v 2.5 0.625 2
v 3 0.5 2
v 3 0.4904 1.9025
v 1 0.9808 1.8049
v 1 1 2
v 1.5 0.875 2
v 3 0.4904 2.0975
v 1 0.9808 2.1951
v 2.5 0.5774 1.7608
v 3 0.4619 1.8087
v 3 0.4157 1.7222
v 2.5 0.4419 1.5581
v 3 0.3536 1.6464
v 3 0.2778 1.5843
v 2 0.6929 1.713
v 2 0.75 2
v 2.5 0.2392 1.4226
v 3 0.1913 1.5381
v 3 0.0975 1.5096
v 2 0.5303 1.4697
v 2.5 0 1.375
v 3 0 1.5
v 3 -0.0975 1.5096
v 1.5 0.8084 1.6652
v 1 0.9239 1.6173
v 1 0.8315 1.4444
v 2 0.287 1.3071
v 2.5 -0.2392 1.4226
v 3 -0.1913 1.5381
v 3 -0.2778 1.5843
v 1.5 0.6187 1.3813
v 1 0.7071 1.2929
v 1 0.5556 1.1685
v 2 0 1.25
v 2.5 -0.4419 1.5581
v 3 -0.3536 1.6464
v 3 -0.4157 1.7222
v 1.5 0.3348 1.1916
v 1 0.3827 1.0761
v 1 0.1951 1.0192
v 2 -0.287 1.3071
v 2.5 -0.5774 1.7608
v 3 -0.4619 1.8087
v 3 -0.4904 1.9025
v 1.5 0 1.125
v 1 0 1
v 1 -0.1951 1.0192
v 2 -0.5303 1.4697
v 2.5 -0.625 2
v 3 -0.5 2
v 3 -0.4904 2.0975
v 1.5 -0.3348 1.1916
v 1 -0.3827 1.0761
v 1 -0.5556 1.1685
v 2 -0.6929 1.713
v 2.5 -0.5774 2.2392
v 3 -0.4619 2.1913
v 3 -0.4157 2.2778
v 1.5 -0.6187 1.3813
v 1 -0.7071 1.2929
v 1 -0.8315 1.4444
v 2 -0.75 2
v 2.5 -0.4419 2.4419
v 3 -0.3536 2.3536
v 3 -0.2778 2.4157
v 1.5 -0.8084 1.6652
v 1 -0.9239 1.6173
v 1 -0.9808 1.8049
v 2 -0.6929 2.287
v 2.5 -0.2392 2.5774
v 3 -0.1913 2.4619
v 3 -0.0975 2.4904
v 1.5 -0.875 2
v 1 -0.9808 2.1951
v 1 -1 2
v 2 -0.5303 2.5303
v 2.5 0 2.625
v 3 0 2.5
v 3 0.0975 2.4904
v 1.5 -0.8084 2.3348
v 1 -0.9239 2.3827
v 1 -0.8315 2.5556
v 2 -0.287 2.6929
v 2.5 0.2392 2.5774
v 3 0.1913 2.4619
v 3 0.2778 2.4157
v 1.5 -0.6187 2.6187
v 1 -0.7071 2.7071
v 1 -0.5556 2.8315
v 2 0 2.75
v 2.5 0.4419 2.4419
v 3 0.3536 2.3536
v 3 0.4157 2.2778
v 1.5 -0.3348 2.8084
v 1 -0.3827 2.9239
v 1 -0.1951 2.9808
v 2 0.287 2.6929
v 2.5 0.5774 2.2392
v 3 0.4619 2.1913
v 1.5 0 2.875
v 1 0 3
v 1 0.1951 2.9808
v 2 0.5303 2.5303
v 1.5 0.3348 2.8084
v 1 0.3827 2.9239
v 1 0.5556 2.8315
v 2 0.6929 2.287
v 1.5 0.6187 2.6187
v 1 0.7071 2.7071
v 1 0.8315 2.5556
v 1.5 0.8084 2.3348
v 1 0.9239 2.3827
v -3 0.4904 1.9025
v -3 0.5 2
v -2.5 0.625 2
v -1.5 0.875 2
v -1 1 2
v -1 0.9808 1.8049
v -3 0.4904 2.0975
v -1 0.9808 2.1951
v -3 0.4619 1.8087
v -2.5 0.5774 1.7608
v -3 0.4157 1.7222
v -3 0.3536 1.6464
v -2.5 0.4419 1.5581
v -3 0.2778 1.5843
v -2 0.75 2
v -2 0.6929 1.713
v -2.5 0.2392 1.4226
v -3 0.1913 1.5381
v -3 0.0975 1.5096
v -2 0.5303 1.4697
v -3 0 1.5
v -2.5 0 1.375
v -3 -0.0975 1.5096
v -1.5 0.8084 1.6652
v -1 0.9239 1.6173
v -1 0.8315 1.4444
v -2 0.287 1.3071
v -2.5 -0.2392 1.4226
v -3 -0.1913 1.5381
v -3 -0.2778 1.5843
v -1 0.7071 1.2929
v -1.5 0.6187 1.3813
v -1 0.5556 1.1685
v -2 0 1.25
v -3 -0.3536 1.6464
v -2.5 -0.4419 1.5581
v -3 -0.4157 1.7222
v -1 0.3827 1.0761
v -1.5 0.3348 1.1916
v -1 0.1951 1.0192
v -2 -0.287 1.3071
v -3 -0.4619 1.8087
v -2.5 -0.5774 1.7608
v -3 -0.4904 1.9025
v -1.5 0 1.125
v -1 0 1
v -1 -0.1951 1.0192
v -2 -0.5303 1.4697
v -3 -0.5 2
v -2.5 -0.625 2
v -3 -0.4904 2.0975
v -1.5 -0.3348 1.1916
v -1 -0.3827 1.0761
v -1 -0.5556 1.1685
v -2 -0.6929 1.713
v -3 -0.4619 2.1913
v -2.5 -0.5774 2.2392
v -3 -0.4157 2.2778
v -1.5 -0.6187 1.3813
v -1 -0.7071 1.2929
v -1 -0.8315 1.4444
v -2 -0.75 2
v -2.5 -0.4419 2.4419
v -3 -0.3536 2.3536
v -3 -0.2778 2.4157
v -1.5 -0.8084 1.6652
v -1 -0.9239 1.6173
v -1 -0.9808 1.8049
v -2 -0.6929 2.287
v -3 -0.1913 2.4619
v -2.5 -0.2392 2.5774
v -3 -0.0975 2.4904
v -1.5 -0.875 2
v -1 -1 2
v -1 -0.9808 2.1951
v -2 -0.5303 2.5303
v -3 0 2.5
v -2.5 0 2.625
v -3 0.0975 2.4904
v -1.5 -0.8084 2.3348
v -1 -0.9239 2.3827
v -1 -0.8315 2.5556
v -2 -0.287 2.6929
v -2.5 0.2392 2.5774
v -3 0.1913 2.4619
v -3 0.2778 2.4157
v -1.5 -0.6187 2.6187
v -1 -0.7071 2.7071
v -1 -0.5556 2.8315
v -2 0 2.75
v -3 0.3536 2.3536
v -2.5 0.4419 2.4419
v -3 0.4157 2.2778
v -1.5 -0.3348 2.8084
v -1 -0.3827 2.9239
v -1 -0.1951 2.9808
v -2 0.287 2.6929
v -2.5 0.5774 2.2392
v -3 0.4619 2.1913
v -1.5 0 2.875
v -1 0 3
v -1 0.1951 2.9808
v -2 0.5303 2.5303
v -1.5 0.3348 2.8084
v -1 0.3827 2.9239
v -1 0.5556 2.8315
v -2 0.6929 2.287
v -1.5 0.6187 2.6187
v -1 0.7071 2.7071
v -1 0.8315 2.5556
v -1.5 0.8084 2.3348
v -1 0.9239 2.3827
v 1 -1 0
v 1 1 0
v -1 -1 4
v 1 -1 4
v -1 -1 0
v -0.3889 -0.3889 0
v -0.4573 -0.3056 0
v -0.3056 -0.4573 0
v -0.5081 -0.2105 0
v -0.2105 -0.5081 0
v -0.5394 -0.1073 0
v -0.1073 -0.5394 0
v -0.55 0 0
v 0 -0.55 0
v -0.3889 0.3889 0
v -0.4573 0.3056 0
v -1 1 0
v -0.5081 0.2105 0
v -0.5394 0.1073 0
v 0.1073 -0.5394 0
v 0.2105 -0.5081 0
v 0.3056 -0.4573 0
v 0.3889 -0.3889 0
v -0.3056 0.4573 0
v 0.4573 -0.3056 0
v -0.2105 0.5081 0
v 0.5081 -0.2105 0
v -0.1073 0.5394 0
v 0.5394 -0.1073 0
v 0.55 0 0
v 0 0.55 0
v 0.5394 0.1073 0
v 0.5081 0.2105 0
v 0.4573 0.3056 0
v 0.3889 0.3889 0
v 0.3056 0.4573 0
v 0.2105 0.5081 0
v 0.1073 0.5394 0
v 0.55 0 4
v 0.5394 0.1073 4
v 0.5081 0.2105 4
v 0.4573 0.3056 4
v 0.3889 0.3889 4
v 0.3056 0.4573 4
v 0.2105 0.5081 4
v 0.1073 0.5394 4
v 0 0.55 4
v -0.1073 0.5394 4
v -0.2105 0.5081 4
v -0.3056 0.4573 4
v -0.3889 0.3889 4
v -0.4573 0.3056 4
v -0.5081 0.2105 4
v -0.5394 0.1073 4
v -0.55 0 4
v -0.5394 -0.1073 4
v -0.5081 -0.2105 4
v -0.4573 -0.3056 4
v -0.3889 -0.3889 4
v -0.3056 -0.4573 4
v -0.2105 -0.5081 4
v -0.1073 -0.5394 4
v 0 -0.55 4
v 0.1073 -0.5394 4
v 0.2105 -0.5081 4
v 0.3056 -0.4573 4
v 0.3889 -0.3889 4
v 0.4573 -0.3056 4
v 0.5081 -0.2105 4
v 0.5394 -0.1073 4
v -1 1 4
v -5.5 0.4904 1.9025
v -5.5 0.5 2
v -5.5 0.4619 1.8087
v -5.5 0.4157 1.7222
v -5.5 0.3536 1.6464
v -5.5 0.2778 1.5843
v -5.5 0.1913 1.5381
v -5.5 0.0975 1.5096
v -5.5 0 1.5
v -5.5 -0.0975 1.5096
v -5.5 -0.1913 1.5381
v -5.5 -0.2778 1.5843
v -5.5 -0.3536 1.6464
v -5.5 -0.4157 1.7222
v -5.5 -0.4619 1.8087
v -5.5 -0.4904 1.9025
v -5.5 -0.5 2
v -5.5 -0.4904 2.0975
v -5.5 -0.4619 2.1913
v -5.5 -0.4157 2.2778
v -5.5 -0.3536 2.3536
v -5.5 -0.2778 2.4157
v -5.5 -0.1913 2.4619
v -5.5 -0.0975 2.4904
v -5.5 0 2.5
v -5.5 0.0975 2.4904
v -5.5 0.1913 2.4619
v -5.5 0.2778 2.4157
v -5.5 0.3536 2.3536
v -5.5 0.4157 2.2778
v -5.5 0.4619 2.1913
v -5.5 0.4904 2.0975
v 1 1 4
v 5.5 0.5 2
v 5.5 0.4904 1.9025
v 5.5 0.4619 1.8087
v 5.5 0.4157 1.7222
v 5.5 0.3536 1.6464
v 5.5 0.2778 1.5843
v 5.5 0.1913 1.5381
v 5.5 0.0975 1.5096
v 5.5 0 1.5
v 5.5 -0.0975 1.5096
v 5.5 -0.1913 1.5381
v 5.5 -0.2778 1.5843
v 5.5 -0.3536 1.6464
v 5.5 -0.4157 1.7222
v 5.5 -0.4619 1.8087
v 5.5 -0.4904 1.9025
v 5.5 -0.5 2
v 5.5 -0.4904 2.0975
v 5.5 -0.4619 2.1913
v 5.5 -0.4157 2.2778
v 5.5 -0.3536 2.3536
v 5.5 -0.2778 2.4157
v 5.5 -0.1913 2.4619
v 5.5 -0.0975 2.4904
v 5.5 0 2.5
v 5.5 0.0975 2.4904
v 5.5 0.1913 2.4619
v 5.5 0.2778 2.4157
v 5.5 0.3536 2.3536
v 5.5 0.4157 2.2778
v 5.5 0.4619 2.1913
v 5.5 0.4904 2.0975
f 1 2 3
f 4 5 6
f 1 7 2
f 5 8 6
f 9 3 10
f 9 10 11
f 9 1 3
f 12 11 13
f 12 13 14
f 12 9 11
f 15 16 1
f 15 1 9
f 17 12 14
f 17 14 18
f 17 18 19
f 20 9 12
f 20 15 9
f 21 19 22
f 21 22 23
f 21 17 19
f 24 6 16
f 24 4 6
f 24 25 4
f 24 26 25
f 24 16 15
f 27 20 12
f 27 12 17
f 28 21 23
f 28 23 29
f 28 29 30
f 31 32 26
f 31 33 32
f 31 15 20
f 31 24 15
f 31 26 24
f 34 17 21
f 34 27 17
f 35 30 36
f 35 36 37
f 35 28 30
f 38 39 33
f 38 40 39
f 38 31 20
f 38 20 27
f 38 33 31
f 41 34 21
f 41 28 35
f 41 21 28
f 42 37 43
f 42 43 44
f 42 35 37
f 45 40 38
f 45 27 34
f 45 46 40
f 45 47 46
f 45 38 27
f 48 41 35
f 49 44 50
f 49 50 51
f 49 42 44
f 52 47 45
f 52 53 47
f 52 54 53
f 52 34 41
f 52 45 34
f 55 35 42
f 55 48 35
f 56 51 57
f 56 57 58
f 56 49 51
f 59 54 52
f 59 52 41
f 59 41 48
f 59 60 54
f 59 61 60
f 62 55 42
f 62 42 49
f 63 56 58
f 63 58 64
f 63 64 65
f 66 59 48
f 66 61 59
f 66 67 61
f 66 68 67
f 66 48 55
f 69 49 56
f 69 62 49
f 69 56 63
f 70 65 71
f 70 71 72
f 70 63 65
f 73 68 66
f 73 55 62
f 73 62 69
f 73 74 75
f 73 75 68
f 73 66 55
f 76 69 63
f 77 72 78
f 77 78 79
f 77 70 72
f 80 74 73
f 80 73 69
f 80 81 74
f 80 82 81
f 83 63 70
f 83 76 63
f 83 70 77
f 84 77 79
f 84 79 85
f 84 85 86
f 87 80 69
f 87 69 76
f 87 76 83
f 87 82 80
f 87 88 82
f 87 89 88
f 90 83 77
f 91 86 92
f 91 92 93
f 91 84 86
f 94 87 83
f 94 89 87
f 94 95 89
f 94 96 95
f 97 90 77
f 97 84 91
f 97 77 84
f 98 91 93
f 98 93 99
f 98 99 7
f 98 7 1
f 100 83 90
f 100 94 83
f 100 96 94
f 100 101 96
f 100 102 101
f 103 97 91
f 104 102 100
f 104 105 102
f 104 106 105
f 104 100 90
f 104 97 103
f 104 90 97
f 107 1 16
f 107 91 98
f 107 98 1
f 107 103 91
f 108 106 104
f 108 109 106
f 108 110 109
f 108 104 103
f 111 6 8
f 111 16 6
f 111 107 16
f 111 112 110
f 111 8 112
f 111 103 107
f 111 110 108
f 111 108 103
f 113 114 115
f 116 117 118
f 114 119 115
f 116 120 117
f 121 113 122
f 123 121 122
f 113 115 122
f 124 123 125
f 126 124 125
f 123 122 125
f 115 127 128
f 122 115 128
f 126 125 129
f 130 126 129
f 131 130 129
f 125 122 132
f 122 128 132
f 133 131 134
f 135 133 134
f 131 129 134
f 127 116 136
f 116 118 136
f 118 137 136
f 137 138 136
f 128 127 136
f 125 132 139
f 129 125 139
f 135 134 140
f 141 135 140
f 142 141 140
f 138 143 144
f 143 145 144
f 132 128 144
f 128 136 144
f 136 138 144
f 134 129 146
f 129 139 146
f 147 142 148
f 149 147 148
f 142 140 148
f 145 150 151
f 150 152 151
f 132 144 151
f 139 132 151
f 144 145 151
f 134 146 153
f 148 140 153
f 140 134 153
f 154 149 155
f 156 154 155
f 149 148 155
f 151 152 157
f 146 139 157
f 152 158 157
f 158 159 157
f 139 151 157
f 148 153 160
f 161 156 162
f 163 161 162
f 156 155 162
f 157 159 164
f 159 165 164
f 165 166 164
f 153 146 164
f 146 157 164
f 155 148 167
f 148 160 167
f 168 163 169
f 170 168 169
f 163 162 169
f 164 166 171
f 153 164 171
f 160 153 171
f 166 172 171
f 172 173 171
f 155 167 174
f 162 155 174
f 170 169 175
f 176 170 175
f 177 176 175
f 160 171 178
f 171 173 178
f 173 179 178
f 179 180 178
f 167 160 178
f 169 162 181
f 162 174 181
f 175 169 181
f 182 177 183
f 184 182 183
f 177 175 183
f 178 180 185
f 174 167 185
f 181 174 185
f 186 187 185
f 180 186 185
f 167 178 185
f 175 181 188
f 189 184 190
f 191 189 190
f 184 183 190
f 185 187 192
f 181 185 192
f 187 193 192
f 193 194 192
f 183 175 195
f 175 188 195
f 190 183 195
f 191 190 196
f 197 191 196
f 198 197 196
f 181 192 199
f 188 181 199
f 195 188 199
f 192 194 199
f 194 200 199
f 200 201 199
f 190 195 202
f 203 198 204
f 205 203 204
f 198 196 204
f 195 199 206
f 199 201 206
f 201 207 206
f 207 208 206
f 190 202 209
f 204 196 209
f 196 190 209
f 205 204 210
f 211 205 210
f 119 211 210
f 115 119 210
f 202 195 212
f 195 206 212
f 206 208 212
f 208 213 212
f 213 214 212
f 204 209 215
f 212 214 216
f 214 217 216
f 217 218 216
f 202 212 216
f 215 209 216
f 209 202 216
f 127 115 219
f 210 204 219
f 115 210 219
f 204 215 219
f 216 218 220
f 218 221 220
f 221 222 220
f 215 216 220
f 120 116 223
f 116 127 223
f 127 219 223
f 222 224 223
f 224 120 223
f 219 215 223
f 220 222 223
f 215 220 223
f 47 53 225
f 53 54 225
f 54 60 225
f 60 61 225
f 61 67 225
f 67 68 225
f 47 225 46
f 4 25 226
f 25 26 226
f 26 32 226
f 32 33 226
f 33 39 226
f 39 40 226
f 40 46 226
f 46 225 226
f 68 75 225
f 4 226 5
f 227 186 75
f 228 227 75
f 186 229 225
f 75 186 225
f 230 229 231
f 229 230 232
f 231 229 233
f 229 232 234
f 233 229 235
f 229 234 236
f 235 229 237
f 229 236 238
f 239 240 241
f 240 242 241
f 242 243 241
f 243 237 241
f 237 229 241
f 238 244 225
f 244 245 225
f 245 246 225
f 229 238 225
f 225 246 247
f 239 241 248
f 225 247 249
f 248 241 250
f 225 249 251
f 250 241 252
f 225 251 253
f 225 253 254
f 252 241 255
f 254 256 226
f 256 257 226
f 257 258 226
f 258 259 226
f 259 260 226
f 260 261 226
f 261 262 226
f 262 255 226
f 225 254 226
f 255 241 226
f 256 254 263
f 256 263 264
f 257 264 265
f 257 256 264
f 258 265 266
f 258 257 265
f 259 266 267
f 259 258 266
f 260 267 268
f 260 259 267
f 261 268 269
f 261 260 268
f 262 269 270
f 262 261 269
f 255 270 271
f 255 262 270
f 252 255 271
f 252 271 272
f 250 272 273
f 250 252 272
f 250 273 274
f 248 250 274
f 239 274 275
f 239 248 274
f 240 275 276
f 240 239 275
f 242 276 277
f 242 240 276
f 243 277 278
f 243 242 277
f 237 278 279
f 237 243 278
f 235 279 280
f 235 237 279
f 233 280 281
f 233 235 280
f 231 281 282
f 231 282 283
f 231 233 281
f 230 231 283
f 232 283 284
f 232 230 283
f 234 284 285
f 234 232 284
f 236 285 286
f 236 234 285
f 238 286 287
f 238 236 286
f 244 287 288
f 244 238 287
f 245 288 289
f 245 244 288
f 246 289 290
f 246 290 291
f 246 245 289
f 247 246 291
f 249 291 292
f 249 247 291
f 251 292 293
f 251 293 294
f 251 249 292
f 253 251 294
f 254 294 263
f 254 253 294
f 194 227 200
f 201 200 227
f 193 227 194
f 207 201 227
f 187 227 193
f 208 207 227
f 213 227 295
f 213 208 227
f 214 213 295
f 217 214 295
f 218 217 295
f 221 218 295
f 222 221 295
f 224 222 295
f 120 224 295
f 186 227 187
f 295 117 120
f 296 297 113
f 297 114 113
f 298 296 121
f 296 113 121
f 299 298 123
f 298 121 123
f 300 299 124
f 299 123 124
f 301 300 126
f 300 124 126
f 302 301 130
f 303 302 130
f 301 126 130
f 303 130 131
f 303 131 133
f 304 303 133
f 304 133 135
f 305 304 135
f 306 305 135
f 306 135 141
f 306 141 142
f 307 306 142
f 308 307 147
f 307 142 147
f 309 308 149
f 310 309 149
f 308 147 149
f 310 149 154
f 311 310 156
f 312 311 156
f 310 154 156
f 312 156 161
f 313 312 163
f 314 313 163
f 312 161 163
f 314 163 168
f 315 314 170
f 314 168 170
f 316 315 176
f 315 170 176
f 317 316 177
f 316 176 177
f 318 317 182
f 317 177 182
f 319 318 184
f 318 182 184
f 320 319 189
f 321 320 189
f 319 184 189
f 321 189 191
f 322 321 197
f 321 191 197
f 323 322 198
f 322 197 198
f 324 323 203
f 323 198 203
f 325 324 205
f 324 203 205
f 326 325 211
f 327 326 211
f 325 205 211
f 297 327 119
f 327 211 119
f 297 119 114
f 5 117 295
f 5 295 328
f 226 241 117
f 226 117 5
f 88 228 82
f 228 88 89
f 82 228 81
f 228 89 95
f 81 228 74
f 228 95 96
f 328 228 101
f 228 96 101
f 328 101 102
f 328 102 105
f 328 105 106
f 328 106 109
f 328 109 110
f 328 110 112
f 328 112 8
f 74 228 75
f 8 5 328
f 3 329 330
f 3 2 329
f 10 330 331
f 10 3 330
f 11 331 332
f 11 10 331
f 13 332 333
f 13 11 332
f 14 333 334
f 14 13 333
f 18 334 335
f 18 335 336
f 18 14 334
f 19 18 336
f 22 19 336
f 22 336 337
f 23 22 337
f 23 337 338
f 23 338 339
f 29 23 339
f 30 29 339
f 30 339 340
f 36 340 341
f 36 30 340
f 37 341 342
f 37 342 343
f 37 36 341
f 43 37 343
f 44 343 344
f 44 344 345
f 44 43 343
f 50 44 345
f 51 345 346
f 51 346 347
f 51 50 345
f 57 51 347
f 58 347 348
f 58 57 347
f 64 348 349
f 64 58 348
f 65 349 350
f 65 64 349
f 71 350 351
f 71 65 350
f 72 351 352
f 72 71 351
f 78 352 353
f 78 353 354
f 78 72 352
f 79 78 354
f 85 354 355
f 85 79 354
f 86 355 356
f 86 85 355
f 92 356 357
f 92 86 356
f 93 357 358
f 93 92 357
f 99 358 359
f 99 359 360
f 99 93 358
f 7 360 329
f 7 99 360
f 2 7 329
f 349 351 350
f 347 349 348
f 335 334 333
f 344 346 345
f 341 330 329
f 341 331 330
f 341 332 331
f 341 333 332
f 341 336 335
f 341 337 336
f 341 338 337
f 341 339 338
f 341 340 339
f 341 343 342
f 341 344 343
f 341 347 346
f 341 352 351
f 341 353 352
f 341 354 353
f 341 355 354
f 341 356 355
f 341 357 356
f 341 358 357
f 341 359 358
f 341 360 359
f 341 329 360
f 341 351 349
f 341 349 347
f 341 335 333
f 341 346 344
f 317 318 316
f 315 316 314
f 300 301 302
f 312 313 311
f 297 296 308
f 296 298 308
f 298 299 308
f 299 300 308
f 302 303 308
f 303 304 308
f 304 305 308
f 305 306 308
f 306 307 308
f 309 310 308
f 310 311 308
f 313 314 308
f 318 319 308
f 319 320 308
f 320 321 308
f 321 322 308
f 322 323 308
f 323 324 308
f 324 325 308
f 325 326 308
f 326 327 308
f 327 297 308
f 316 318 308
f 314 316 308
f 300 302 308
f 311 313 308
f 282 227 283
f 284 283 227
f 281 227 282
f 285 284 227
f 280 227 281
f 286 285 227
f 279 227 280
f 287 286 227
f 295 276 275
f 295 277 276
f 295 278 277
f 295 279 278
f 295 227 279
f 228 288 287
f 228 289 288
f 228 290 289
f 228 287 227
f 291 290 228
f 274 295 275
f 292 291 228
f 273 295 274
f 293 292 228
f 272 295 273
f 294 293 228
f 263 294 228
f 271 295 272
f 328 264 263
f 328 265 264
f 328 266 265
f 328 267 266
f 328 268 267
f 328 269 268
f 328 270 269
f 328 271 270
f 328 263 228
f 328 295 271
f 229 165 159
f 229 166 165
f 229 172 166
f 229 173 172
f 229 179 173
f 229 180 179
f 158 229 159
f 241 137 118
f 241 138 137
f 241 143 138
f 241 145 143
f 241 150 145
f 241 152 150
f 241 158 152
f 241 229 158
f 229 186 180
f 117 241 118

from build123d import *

# Parameters (mm, degrees)
SKETCH1_W           = 2
SKETCH1_H           = 2
SKETCH1_R           = 0.55
BOSS_EXTRUDE1_DEPTH = 4


with BuildPart() as part:
    # Sketch1 → Boss-Extrude1 (new body)
    with BuildSketch(Plane.XY):
        Rectangle(SKETCH1_W, SKETCH1_H)
        Circle(SKETCH1_R, mode=Mode.SUBTRACT)
    extrude(amount=BOSS_EXTRUDE1_DEPTH)

    # 草图1 → 旋转1 (revolve)
    with BuildSketch(Plane.XY.offset(2)):
        Polygon((1, 1), (1, 0), (5.5, 0), (5.5, 0.5), (3, 0.5), align=None)
        Polygon((-1, 0), (-5.5, 0), (-5.5, 0.5), (-3, 0.5), (-1, 1), align=None)
    revolve(axis=Axis((-1, 0, 2), (-1, 0, 0)))


solid = part.part
